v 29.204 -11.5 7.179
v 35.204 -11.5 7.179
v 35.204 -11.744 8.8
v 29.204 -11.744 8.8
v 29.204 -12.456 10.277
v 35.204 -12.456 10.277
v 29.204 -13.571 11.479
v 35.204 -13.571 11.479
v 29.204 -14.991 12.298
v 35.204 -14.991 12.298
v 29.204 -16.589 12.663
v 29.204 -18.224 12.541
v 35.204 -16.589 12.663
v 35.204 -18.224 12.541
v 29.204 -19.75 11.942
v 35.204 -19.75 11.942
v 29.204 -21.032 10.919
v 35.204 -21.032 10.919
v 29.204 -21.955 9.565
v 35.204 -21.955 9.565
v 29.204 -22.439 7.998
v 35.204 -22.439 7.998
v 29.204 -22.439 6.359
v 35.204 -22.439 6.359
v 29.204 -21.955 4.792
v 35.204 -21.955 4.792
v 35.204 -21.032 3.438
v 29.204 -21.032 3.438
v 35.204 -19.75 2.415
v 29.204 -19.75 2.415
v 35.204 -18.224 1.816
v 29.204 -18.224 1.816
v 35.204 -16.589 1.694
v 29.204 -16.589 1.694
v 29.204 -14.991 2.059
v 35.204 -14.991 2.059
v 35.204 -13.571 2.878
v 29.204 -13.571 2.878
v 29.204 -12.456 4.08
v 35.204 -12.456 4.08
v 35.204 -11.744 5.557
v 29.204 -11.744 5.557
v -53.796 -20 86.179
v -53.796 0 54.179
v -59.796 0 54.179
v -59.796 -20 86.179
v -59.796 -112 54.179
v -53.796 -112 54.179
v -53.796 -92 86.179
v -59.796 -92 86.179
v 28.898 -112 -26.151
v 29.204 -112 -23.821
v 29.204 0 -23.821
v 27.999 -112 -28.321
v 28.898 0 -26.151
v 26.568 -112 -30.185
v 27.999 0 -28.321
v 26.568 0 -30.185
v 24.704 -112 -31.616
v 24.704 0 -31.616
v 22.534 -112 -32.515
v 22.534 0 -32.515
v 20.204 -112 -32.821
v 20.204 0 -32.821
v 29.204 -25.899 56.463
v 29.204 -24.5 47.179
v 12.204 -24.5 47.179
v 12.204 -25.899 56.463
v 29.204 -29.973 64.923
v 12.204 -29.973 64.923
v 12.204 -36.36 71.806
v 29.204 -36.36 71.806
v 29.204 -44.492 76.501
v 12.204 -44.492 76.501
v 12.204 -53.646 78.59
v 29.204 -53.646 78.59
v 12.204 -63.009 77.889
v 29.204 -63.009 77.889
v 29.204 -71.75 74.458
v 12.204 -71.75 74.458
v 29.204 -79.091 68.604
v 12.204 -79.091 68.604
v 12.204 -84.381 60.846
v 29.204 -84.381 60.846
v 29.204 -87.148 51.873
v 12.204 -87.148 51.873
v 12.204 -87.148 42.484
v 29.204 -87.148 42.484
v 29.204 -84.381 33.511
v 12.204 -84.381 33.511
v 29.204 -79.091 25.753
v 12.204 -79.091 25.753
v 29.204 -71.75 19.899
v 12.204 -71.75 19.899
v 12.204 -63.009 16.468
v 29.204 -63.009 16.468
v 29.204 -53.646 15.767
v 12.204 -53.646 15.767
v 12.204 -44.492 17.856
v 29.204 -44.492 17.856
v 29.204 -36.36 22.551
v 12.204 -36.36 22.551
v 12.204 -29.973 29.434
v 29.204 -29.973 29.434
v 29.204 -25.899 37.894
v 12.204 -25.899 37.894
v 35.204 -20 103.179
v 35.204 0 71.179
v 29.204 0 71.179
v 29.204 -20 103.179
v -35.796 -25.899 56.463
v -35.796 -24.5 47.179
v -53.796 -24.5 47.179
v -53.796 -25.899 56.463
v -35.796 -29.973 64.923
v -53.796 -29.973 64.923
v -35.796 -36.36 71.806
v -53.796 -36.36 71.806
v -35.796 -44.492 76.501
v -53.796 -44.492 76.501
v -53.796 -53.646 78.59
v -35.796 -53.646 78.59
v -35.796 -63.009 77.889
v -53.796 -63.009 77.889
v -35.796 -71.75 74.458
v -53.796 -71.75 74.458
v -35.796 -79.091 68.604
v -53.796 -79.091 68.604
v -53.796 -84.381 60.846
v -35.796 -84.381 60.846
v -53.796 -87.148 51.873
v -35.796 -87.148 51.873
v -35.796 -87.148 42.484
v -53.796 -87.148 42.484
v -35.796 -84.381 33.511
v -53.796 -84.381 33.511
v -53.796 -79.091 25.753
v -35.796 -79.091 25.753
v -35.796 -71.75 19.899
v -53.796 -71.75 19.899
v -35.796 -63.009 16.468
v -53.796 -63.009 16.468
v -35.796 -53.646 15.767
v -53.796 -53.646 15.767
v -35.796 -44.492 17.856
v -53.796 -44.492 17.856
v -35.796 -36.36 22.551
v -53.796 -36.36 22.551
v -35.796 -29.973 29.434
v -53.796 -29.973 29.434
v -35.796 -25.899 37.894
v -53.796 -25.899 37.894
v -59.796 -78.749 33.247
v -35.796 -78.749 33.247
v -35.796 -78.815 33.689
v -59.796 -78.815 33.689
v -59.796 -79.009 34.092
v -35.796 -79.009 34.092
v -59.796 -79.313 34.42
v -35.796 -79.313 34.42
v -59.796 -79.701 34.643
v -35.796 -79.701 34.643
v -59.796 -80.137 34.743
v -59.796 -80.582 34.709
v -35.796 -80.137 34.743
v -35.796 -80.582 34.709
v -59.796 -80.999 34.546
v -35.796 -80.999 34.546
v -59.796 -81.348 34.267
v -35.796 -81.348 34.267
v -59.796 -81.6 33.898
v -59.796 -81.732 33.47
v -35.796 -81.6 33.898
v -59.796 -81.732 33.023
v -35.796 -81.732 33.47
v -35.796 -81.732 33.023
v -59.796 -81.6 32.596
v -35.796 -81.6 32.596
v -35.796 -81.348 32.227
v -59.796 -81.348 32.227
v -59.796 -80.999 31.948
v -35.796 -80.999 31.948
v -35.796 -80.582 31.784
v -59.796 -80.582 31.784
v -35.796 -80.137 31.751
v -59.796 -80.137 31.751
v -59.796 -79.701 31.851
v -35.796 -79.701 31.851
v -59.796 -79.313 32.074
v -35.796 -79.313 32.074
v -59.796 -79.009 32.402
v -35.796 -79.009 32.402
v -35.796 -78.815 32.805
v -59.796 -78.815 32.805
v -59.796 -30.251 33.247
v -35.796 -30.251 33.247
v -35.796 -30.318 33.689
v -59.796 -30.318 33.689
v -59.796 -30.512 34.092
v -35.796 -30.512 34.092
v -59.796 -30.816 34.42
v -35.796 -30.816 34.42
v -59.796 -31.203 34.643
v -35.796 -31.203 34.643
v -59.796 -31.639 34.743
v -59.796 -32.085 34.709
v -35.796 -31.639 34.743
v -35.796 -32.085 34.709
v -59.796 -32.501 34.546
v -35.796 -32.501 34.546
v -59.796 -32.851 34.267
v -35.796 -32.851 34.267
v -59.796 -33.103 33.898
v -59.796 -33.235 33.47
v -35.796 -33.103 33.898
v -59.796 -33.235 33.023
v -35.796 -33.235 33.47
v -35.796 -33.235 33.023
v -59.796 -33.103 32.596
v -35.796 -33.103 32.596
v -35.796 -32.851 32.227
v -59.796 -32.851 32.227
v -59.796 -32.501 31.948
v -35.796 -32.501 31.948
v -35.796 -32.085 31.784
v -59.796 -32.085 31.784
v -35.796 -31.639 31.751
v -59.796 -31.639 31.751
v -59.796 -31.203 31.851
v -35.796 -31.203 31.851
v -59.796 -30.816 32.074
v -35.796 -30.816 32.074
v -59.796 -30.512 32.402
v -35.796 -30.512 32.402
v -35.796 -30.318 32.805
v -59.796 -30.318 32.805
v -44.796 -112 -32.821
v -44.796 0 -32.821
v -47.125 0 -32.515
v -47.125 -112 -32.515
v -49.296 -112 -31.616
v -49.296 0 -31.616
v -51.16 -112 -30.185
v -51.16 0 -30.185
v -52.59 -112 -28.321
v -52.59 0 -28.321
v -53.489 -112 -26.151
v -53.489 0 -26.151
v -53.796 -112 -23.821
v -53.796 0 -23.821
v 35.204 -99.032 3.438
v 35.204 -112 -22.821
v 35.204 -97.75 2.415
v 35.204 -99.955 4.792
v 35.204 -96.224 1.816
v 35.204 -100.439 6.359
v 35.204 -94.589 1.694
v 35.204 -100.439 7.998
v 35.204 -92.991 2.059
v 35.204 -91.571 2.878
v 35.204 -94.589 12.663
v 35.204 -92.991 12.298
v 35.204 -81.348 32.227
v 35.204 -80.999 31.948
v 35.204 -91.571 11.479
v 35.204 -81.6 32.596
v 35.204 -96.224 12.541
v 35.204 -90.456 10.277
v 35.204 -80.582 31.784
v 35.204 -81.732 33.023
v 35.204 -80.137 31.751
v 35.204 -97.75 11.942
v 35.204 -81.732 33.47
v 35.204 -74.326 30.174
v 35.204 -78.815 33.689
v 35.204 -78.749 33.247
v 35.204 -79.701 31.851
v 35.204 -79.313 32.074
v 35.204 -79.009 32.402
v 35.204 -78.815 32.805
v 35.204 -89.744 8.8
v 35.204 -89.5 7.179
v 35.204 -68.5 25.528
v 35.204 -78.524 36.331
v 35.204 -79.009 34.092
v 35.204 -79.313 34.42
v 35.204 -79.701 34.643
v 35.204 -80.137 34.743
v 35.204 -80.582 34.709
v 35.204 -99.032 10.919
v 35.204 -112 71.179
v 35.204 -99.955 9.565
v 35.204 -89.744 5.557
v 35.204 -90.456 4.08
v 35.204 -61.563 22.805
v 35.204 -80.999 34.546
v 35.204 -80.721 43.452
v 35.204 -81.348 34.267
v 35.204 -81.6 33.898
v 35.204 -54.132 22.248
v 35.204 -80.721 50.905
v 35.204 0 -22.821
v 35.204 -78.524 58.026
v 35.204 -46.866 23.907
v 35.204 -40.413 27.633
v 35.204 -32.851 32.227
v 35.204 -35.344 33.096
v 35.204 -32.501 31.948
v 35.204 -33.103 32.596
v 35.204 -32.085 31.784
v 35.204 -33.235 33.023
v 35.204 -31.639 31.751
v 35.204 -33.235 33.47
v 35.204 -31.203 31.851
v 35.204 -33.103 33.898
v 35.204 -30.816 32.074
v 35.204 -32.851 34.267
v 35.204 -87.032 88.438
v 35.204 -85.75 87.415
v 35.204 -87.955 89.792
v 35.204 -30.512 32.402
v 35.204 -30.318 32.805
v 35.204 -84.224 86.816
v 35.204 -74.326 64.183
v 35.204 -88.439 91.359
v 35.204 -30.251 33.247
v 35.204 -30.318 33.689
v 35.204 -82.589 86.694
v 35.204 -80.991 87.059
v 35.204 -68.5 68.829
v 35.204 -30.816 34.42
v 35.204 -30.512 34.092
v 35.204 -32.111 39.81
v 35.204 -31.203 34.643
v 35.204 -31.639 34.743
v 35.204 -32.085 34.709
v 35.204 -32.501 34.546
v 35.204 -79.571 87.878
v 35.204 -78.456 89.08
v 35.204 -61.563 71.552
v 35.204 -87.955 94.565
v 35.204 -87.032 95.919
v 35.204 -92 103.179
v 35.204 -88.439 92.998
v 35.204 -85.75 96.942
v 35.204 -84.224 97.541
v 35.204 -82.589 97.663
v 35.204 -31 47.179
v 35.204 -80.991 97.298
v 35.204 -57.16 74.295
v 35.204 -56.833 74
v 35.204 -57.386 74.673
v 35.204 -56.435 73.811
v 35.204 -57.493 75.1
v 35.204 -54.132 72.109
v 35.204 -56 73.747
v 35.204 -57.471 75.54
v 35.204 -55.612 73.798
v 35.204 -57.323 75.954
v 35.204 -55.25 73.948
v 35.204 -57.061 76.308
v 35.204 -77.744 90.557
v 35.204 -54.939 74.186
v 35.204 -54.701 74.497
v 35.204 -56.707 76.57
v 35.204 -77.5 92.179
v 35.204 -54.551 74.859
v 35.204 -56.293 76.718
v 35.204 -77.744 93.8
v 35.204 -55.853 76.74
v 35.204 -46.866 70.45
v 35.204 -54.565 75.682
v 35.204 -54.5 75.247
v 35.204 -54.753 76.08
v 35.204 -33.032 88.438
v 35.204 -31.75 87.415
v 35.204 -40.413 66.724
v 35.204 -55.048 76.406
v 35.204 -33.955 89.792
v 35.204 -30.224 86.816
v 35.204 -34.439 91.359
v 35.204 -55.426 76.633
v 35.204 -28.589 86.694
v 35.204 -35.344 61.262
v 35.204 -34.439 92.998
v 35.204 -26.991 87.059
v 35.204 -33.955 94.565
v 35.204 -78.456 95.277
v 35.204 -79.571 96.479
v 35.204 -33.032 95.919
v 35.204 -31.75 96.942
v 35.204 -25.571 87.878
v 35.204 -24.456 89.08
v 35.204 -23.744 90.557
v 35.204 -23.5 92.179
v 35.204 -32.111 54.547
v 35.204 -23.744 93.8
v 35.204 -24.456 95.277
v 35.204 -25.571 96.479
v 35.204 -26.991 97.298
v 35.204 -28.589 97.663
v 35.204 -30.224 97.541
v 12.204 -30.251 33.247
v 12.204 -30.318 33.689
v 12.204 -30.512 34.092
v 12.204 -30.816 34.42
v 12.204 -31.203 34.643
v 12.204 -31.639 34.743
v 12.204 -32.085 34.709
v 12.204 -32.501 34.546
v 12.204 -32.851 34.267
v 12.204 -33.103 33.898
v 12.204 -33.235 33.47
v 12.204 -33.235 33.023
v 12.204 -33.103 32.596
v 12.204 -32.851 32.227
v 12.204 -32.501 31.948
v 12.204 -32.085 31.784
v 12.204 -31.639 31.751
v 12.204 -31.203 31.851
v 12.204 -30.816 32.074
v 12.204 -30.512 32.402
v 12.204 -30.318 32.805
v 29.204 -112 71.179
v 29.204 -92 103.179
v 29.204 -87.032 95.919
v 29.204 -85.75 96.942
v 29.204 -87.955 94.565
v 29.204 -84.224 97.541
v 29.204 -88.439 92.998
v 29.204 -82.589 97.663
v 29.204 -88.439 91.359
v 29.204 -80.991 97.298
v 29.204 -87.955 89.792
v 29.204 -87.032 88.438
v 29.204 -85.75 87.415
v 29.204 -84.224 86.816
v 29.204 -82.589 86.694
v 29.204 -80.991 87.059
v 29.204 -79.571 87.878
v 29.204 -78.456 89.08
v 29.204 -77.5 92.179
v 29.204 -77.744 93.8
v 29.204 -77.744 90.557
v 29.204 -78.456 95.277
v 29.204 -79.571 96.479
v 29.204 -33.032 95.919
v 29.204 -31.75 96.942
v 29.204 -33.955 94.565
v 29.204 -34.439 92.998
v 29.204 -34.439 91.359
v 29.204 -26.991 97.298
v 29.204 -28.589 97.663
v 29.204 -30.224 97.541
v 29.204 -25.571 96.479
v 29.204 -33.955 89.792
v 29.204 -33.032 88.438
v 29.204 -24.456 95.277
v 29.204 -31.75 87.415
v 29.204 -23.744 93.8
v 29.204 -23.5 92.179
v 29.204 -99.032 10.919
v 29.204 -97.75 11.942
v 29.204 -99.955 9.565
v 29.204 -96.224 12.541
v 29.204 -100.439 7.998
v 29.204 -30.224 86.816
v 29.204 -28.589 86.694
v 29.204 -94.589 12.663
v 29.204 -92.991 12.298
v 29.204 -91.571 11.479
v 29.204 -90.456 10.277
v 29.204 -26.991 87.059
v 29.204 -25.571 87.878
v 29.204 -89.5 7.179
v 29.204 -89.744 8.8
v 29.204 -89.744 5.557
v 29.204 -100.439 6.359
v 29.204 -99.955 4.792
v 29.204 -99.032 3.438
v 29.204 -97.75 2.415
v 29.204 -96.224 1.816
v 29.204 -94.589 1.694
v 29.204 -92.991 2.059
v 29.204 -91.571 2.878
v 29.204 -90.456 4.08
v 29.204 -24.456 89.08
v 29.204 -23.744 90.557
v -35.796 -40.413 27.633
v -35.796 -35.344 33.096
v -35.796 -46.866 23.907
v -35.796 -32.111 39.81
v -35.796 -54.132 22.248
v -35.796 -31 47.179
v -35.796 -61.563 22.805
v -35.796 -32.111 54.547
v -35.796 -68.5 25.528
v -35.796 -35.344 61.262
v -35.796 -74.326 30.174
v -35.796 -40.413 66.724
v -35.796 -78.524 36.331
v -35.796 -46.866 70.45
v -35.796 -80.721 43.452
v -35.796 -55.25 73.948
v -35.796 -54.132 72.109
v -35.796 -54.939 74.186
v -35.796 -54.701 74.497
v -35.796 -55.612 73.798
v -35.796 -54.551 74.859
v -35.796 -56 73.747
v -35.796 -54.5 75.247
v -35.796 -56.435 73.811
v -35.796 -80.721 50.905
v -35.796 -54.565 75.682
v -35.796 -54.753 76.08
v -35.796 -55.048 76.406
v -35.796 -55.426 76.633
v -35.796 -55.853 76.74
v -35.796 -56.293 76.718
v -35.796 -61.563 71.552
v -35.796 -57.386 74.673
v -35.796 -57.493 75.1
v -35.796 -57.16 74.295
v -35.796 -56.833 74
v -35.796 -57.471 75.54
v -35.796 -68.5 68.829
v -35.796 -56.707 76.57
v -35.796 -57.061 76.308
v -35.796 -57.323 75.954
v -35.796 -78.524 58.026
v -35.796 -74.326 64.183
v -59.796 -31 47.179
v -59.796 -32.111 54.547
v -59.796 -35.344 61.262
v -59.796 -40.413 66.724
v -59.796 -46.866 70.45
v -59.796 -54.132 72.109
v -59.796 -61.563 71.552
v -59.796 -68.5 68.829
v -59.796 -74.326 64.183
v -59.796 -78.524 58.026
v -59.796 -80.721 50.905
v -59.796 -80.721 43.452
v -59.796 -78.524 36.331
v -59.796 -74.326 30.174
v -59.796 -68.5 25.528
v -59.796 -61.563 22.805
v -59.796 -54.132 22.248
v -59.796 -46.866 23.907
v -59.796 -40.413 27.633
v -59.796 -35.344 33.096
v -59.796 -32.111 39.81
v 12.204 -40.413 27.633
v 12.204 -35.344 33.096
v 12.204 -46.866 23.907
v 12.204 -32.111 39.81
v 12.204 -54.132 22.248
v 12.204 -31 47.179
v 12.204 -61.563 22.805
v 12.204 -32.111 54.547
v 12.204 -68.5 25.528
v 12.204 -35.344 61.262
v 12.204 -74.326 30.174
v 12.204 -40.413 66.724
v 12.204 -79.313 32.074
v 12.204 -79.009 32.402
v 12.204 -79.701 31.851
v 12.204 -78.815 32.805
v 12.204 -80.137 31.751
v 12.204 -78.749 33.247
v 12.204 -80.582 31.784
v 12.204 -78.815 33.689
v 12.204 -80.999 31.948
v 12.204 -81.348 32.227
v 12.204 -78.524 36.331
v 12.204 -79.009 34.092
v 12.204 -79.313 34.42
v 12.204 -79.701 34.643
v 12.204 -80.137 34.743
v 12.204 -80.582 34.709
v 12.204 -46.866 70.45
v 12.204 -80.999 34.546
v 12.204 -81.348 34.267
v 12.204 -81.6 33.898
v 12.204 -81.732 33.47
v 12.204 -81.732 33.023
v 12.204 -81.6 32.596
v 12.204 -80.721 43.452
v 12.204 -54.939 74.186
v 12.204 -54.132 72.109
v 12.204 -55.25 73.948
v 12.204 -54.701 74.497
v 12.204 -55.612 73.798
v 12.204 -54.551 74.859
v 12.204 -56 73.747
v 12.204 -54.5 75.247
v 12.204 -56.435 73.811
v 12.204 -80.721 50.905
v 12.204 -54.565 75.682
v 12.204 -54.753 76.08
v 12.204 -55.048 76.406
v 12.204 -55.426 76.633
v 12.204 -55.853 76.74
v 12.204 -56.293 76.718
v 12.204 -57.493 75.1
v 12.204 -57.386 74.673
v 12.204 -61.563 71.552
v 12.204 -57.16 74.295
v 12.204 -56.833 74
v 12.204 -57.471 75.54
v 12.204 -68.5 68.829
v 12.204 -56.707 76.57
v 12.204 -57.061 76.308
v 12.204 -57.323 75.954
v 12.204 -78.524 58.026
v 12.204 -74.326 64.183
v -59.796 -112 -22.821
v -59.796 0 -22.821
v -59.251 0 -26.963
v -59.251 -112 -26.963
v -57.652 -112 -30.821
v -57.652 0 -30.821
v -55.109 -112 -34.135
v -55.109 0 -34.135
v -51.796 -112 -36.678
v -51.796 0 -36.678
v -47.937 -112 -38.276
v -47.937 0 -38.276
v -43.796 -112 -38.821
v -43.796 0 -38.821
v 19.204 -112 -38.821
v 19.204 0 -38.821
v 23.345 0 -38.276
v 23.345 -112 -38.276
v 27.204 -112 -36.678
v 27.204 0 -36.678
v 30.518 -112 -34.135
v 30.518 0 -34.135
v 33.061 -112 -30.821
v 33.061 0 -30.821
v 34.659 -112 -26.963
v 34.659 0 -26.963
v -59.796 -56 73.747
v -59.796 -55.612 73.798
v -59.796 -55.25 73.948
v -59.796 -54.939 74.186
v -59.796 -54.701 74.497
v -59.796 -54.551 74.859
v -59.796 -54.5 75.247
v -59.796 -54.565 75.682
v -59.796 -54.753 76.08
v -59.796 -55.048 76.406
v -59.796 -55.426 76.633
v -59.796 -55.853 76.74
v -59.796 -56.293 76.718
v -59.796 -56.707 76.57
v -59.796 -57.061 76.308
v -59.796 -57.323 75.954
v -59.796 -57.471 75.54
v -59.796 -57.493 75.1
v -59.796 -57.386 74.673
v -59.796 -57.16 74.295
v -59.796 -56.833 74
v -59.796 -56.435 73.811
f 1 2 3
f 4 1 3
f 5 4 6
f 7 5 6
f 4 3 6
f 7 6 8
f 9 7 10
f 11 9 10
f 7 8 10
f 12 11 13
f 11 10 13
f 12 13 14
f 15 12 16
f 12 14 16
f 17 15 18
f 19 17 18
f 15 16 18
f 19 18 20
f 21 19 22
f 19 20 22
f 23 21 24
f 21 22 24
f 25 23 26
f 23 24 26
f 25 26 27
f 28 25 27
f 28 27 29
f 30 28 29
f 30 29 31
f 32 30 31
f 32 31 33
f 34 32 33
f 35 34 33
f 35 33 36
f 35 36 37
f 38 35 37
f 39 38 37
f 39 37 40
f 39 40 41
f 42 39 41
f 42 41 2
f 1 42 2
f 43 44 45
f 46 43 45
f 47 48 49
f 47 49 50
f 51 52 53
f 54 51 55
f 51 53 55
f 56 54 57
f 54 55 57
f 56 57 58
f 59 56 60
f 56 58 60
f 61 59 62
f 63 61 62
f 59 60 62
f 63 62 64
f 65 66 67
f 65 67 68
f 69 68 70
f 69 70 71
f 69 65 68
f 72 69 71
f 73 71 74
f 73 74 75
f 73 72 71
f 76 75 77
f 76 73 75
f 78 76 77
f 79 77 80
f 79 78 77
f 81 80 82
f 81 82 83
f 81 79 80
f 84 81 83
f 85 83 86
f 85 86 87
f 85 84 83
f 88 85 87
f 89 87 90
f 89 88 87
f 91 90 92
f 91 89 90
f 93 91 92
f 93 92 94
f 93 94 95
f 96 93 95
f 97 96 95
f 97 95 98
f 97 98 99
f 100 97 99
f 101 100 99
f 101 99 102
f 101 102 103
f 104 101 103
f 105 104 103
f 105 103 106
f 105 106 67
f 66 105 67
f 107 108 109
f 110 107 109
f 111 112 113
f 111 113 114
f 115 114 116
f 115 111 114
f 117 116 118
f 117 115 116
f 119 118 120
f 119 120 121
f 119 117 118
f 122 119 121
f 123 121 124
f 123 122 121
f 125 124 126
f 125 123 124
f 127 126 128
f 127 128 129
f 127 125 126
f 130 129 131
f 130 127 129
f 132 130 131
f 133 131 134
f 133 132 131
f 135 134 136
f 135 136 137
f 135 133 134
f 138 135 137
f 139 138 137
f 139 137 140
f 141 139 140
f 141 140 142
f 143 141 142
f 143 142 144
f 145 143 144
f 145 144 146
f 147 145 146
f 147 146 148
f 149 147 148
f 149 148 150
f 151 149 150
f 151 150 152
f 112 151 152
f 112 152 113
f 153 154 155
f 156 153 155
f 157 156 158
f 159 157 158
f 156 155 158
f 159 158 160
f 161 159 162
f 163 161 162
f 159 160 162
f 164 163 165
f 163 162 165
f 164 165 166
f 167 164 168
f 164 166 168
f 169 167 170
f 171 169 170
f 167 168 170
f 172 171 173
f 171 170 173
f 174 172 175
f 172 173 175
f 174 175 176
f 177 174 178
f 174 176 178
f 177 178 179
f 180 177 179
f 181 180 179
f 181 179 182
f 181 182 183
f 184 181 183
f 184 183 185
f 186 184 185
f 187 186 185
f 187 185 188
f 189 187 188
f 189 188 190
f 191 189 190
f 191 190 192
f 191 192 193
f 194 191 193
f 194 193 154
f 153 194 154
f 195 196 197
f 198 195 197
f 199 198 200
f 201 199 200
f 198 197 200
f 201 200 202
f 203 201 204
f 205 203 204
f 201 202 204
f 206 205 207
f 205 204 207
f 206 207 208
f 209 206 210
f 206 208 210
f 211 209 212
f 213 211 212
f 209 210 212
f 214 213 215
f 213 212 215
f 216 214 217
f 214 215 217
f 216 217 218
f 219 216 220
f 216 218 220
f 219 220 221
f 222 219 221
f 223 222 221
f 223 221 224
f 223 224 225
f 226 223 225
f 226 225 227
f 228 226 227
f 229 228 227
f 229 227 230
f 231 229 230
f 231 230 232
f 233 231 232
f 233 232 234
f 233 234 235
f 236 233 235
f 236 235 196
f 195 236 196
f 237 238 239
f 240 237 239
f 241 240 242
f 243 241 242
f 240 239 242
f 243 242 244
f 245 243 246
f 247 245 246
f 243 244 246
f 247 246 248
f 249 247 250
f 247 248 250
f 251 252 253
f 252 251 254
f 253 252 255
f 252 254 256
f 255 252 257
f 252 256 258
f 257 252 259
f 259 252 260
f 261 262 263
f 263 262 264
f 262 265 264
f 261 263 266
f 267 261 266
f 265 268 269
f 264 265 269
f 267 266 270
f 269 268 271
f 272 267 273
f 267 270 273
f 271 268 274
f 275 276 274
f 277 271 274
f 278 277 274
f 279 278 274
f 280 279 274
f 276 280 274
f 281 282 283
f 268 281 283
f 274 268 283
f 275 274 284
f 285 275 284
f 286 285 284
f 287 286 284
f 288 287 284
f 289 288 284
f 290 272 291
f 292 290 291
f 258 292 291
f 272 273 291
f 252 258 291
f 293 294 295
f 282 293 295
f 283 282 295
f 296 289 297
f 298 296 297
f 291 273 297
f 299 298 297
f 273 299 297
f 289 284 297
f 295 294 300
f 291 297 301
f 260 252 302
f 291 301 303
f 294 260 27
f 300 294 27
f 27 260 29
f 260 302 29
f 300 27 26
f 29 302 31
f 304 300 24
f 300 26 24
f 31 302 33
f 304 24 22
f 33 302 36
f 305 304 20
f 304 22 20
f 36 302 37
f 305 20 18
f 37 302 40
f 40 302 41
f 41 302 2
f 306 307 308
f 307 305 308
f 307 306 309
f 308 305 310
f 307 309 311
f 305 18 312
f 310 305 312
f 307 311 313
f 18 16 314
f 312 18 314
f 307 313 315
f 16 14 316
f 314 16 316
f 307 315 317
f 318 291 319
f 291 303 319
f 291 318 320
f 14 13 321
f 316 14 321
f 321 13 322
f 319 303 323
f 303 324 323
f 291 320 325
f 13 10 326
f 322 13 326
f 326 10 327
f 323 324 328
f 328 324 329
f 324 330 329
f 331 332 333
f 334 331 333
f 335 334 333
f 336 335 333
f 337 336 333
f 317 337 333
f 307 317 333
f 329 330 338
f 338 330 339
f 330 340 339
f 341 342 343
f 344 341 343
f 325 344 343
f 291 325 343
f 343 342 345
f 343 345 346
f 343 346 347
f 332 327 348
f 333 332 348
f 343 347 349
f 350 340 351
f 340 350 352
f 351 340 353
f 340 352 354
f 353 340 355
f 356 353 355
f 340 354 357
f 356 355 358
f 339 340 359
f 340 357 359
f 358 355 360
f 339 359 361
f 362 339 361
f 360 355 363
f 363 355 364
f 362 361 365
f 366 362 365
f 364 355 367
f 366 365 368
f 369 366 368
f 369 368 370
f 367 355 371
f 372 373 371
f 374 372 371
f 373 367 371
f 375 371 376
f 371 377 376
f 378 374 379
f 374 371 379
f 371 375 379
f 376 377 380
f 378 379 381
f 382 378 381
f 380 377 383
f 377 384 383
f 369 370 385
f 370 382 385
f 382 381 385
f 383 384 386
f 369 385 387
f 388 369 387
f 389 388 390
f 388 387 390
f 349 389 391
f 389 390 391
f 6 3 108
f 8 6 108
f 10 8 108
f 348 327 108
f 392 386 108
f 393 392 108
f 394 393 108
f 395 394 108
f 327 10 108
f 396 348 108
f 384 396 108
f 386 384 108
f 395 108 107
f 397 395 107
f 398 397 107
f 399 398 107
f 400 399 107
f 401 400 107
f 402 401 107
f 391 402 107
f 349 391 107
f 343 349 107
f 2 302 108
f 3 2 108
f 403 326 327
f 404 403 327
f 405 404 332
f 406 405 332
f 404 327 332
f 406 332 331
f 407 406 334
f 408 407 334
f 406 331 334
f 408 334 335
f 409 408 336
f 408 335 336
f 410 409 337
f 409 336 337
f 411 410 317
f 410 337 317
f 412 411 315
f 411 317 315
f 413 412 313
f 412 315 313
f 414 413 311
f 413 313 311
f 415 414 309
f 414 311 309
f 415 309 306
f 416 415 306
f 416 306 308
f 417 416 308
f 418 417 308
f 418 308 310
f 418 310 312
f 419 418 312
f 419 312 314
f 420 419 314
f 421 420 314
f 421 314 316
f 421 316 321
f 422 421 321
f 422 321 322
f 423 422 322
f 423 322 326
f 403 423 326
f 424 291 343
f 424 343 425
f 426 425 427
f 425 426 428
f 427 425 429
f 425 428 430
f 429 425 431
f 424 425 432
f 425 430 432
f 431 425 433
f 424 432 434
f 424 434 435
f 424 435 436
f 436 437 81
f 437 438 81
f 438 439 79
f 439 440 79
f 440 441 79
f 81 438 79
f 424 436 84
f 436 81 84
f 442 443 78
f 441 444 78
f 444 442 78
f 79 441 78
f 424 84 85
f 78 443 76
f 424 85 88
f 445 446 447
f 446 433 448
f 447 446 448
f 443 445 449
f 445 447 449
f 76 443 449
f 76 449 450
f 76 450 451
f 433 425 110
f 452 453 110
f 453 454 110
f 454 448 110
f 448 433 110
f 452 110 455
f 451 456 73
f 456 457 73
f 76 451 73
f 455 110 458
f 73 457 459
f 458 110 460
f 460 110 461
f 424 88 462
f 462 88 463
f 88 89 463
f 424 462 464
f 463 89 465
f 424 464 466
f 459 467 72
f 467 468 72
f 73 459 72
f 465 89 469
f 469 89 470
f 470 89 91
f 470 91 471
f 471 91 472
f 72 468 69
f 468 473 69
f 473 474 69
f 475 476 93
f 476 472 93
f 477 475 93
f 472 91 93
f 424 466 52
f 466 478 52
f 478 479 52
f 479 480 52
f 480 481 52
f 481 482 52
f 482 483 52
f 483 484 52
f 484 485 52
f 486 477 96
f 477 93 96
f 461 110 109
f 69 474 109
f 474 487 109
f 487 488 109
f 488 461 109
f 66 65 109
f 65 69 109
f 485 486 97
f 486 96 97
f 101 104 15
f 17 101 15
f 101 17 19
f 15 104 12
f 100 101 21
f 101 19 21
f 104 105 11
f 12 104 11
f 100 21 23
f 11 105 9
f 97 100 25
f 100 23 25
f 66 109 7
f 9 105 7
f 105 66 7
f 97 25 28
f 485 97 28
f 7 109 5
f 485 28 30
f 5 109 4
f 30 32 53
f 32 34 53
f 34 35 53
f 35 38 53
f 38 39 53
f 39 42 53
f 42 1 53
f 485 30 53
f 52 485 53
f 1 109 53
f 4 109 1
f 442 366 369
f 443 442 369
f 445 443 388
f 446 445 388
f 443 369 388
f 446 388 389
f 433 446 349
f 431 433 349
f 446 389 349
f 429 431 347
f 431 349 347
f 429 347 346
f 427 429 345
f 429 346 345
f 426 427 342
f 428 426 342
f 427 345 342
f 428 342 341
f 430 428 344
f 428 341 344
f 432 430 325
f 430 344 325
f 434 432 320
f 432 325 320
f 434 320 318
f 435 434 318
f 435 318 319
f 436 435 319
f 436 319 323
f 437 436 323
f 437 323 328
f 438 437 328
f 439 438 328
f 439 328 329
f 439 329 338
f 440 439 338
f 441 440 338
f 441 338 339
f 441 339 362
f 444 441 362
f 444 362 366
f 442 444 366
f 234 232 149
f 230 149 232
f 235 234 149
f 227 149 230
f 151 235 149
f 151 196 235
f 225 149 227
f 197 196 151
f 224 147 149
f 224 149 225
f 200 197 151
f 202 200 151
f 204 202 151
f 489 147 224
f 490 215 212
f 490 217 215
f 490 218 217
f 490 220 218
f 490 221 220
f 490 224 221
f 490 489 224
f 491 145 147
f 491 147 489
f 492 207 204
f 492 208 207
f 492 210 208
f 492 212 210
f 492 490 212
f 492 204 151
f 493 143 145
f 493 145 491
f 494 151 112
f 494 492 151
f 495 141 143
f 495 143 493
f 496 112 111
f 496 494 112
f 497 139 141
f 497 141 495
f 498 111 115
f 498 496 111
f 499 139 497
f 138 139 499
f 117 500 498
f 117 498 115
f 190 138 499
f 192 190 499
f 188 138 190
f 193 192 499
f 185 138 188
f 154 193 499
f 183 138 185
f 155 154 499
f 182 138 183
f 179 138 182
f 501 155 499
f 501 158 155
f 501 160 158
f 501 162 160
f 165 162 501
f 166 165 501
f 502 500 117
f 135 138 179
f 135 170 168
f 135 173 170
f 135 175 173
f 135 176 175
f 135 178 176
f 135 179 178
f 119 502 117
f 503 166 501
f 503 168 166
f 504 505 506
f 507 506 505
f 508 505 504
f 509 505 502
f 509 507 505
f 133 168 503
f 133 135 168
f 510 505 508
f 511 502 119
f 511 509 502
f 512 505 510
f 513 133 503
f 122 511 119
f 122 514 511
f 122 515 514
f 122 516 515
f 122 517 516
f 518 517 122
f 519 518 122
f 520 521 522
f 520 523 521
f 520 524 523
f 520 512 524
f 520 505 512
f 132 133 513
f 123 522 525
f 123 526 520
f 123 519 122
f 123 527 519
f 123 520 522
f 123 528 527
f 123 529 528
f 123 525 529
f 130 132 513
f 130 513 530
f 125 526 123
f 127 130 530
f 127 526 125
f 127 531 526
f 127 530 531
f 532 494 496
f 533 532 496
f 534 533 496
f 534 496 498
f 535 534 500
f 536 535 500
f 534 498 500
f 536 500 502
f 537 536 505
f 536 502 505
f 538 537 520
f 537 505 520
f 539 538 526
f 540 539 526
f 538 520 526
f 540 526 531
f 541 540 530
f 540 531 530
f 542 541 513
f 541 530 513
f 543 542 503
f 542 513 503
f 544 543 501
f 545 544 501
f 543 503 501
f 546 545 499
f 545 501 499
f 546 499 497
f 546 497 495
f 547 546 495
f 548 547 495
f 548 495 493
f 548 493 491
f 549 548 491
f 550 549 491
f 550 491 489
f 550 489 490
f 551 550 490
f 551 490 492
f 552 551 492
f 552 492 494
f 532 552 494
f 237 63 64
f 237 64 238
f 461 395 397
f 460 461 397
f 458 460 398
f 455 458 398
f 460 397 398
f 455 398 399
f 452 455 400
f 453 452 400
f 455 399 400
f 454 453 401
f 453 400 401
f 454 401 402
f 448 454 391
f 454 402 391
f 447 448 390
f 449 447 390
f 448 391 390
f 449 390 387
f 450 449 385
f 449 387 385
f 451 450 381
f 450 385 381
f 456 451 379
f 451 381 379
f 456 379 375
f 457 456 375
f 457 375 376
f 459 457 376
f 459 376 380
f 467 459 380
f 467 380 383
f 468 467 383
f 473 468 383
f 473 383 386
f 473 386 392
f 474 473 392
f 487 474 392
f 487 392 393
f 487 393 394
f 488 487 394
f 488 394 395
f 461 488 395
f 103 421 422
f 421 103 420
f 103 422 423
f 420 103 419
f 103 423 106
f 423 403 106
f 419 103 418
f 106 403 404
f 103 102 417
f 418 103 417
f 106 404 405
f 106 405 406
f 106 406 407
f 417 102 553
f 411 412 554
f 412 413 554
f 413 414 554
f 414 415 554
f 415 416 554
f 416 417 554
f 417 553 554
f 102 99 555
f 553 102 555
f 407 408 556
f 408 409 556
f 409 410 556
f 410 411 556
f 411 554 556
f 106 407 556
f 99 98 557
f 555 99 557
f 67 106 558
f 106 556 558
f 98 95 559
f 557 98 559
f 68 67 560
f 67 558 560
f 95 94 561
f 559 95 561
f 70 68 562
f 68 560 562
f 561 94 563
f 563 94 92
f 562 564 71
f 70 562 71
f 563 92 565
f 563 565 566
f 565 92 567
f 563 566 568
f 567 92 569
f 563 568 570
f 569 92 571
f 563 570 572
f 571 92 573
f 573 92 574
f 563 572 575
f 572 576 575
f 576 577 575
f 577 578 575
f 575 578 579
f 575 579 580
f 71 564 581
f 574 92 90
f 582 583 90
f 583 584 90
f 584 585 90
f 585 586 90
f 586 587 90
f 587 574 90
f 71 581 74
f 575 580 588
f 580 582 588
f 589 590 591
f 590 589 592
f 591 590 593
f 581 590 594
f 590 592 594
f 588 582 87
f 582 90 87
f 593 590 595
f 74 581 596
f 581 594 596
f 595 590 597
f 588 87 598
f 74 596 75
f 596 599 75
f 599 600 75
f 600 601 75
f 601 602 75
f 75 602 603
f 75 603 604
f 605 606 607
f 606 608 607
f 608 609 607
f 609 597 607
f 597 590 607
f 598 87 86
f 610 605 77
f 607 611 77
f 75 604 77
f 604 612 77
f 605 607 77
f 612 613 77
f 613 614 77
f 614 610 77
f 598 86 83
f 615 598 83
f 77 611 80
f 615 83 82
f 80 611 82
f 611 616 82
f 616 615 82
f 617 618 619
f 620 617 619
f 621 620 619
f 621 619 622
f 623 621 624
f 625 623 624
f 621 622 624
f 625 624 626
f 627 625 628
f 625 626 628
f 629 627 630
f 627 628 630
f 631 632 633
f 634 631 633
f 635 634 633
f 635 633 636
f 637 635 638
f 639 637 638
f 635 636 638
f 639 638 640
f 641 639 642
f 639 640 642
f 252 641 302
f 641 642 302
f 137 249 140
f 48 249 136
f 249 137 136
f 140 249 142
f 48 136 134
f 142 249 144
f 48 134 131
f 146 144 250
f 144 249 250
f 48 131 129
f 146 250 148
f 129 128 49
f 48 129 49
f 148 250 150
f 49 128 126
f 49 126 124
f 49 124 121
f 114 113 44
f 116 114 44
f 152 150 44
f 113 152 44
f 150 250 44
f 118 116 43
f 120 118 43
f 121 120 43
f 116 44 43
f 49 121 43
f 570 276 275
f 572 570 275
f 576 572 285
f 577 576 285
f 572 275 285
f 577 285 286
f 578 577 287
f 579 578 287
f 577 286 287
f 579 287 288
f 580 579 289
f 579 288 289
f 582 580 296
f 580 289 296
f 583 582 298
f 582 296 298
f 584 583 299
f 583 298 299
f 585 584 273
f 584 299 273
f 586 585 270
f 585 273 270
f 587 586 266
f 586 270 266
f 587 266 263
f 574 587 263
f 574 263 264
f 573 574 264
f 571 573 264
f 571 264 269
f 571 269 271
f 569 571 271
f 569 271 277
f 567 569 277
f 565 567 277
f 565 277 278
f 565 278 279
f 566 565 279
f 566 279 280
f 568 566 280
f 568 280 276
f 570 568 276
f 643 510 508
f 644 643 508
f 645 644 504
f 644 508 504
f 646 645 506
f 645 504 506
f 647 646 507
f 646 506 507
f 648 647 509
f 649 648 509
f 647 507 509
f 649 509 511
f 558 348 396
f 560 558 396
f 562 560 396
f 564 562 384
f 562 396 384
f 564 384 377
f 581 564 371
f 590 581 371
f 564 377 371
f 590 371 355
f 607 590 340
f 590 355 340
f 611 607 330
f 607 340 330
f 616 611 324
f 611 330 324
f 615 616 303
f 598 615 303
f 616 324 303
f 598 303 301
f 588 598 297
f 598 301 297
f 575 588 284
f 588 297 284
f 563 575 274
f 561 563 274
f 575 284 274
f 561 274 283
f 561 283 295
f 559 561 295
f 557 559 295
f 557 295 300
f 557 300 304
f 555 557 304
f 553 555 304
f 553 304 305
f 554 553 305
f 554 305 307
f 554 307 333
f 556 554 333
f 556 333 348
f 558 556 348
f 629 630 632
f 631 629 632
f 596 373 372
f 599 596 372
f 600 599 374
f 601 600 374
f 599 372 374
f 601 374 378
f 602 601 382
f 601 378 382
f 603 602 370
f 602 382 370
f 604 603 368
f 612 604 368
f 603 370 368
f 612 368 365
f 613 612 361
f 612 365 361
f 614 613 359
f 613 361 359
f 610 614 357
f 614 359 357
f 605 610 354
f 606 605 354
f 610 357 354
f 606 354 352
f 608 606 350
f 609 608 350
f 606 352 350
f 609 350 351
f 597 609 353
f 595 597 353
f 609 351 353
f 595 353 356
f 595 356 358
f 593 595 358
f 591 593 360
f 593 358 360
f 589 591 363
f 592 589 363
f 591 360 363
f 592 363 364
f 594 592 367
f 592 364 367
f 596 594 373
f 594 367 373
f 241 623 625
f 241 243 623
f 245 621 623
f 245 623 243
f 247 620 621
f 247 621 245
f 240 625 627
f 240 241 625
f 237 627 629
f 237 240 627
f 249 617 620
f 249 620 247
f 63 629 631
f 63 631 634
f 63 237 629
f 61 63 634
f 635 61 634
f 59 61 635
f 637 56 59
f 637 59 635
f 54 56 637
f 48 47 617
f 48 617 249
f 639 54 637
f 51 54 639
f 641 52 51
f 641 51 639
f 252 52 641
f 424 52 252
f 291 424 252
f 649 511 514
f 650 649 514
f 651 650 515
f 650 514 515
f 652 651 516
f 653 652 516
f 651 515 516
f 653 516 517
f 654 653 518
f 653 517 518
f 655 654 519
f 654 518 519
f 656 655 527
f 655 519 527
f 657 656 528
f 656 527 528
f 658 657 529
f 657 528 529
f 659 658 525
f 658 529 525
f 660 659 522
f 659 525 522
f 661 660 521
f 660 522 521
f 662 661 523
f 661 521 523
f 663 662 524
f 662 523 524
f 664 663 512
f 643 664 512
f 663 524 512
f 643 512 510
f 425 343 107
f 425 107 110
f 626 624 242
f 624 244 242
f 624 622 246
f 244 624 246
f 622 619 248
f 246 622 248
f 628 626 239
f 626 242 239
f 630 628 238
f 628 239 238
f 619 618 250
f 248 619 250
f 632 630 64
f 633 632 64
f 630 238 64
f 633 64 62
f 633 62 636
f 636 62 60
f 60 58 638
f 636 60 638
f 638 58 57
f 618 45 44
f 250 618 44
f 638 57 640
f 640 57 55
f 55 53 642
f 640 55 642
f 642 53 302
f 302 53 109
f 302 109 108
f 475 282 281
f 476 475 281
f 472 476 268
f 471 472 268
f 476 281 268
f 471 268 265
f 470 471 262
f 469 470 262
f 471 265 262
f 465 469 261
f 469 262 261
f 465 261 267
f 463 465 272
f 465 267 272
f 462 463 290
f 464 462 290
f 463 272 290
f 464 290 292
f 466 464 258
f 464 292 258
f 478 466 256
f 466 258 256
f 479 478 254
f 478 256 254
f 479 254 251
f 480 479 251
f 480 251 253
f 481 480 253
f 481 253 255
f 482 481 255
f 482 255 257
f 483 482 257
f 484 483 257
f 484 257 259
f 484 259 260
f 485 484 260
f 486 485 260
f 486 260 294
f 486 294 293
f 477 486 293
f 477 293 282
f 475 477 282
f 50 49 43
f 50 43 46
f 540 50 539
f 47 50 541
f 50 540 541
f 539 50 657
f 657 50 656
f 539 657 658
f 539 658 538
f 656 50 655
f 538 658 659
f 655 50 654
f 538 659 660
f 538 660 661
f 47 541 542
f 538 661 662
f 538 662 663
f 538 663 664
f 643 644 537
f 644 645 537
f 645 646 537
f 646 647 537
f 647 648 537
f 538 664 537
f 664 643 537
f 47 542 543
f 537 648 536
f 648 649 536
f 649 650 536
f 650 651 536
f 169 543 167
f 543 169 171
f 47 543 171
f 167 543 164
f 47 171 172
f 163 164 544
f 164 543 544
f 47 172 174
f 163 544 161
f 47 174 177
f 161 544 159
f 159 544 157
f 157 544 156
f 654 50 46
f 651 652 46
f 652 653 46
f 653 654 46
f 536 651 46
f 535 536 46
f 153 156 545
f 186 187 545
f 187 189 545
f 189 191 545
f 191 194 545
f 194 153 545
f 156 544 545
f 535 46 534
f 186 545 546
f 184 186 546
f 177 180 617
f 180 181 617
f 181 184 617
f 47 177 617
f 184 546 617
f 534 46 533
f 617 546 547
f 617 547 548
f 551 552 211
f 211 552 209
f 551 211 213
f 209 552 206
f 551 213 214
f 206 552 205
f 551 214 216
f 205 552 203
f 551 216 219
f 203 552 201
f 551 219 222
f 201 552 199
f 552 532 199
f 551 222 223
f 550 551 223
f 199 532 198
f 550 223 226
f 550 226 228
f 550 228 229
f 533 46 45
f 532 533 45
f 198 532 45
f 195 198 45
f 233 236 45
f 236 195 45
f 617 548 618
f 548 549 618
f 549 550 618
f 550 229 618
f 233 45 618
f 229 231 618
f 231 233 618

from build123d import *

# Parameters (mm, degrees)
F1_DEPTH    = 112
F2_R        = 25
F3_DEPTH    = 185
F2_R_2      = 31.5
F5_DEPTH    = 184
F6_DEPTH    = 95
F7_W        = 48
F7_H        = 100
F8_DEPTH    = 159
F9_R        = 5.5
F10_DEPTH   = 39.1
F9_R_2      = 1.5
F11_DEPTH   = 154.4
F12_SIZE2   = 32
F12_SIZE    = 20
F12_2_SIZE2 = 32
F12_2_SIZE  = 20


with BuildPart() as f1:
    # F0 (on Front) → F1 (new body)
    with BuildSketch(Plane.XZ):
        with BuildLine():
            ThreePointArc((-59.7957043946, -22.8214863997), (-55.1094128936, -34.1351948987), (-43.7957043946, -38.8214863997))
            Line((-43.7957043946, -38.8214863997), (19.2042956054, -38.8214863997))
            ThreePointArc((19.2042956054, -38.8214863997), (30.5180041044, -34.1351948987), (35.2042956054, -22.8214863997))
            Line((35.2042956054, -22.8214863997), (35.2042956054, 103.1785136003))
            Line((35.2042956054, 103.1785136003), (29.2042956054, 103.1785136003))
            Line((29.2042956054, 103.1785136003), (29.2042956054, 87.1785136003))
            Line((29.2042956054, 87.1785136003), (29.2042956054, -23.8214863997))
            ThreePointArc((29.2042956054, -23.8214863997), (26.5682566361, -30.1854474304), (20.2042956054, -32.8214863997))
            Line((20.2042956054, -32.8214863997), (-44.7957043946, -32.8214863997))
            ThreePointArc((-44.7957043946, -32.8214863997), (-51.1596654253, -30.1854474304), (-53.7957043946, -23.8214863997))
            Line((-53.7957043946, -23.8214863997), (-53.7957043946, 86.1785136003))
            Line((-53.7957043946, 86.1785136003), (-59.7957043946, 86.1785136003))
            Line((-59.7957043946, 86.1785136003), (-59.7957043946, -22.8214863997))
        make_face()
    extrude(amount=F1_DEPTH)

    # F2 (on face) → F3 (cut)
    with BuildSketch(Plane.YZ.offset(35.2042956054)):
        with Locations((-56, 47.1785136003)):
            Circle(F2_R)
    extrude(amount=-F3_DEPTH, mode=Mode.SUBTRACT)

    # F2 (on face) → F5 (cut)
    with BuildSketch(Plane.YZ.offset(35.2042956054)):
        with Locations((-56, 47.1785136003)):
            Circle(F2_R_2)
        with Locations((-56, 47.1785136003)):
            Circle(F2_R, mode=Mode.SUBTRACT)
    extrude(amount=-F5_DEPTH, mode=Mode.SUBTRACT)

    # F2 (on face) → F6 (join)
    with BuildSketch(Plane.YZ.offset(35.2042956054)):
        with Locations((-56, 47.1785136003)):
            Circle(F2_R_2)
        with Locations((-56, 47.1785136003)):
            Circle(F2_R, mode=Mode.SUBTRACT)
    extrude(amount=-F6_DEPTH)

    # F7 (on offset) → F8 (cut)
    with BuildSketch(Plane.XZ.offset(137)):
        with Locations((-11.7957043946, 29.1785136003)):
            Rectangle(F7_W, F7_H)
    extrude(amount=-F8_DEPTH, mode=Mode.SUBTRACT)

    # F9 (on face) → F10 (cut)
    with BuildSketch(Plane.YZ.offset(35.2042956054)):
        with Locations((-83, 92.1785136003)):
            Circle(F9_R)
        with Locations((-29, 92.1785136003)):
            Circle(F9_R)
        with Locations((-95, 7.1785136003)):
            Circle(F9_R)
        with Locations((-17, 7.1785136003)):
            Circle(F9_R)
    extrude(amount=-F10_DEPTH, mode=Mode.SUBTRACT)

    # F9 (on face) → F11 (cut)
    with BuildSketch(Plane.YZ.offset(35.2042956054)):
        with Locations((-31.751288694, 33.2468845546)):
            Circle(F9_R_2)
        with Locations((-80.248711306, 33.2468845546)):
            Circle(F9_R_2)
        with BuildLine():
            ThreePointArc((-56, 73.7468845546), (-54.9393398282, 74.1862243828), (-54.5, 75.2468845546))
            ThreePointArc((-54.5, 75.2468845546), (-57.0606601718, 76.3075447264), (-56, 73.7468845546))
        make_face()
    extrude(amount=-F11_DEPTH, mode=Mode.SUBTRACT)

    # F12
    f12_edges = [f1.edges().sort_by_distance(p)[0] for p in [
        (-56.795704, 0, 86.178514),
        (-56.795704, -112, 86.178514),
    ]]
    f12_side = f1.faces().sort_by_distance((-56.795704, -56, 86.178514))[0]
    chamfer(f12_edges, length=F12_SIZE, length2=F12_SIZE2, reference=f12_side)

    # F12#2
    f12_2_edges = [f1.edges().sort_by_distance(p)[0] for p in [
        (32.204296, 0, 103.178514),
        (32.204296, -112, 103.178514),
    ]]
    f12_2_side = f1.faces().sort_by_distance((32.204296, -56, 103.178514))[0]
    chamfer(f12_2_edges, length=F12_2_SIZE, length2=F12_2_SIZE2, reference=f12_2_side)


solid = f1.part
